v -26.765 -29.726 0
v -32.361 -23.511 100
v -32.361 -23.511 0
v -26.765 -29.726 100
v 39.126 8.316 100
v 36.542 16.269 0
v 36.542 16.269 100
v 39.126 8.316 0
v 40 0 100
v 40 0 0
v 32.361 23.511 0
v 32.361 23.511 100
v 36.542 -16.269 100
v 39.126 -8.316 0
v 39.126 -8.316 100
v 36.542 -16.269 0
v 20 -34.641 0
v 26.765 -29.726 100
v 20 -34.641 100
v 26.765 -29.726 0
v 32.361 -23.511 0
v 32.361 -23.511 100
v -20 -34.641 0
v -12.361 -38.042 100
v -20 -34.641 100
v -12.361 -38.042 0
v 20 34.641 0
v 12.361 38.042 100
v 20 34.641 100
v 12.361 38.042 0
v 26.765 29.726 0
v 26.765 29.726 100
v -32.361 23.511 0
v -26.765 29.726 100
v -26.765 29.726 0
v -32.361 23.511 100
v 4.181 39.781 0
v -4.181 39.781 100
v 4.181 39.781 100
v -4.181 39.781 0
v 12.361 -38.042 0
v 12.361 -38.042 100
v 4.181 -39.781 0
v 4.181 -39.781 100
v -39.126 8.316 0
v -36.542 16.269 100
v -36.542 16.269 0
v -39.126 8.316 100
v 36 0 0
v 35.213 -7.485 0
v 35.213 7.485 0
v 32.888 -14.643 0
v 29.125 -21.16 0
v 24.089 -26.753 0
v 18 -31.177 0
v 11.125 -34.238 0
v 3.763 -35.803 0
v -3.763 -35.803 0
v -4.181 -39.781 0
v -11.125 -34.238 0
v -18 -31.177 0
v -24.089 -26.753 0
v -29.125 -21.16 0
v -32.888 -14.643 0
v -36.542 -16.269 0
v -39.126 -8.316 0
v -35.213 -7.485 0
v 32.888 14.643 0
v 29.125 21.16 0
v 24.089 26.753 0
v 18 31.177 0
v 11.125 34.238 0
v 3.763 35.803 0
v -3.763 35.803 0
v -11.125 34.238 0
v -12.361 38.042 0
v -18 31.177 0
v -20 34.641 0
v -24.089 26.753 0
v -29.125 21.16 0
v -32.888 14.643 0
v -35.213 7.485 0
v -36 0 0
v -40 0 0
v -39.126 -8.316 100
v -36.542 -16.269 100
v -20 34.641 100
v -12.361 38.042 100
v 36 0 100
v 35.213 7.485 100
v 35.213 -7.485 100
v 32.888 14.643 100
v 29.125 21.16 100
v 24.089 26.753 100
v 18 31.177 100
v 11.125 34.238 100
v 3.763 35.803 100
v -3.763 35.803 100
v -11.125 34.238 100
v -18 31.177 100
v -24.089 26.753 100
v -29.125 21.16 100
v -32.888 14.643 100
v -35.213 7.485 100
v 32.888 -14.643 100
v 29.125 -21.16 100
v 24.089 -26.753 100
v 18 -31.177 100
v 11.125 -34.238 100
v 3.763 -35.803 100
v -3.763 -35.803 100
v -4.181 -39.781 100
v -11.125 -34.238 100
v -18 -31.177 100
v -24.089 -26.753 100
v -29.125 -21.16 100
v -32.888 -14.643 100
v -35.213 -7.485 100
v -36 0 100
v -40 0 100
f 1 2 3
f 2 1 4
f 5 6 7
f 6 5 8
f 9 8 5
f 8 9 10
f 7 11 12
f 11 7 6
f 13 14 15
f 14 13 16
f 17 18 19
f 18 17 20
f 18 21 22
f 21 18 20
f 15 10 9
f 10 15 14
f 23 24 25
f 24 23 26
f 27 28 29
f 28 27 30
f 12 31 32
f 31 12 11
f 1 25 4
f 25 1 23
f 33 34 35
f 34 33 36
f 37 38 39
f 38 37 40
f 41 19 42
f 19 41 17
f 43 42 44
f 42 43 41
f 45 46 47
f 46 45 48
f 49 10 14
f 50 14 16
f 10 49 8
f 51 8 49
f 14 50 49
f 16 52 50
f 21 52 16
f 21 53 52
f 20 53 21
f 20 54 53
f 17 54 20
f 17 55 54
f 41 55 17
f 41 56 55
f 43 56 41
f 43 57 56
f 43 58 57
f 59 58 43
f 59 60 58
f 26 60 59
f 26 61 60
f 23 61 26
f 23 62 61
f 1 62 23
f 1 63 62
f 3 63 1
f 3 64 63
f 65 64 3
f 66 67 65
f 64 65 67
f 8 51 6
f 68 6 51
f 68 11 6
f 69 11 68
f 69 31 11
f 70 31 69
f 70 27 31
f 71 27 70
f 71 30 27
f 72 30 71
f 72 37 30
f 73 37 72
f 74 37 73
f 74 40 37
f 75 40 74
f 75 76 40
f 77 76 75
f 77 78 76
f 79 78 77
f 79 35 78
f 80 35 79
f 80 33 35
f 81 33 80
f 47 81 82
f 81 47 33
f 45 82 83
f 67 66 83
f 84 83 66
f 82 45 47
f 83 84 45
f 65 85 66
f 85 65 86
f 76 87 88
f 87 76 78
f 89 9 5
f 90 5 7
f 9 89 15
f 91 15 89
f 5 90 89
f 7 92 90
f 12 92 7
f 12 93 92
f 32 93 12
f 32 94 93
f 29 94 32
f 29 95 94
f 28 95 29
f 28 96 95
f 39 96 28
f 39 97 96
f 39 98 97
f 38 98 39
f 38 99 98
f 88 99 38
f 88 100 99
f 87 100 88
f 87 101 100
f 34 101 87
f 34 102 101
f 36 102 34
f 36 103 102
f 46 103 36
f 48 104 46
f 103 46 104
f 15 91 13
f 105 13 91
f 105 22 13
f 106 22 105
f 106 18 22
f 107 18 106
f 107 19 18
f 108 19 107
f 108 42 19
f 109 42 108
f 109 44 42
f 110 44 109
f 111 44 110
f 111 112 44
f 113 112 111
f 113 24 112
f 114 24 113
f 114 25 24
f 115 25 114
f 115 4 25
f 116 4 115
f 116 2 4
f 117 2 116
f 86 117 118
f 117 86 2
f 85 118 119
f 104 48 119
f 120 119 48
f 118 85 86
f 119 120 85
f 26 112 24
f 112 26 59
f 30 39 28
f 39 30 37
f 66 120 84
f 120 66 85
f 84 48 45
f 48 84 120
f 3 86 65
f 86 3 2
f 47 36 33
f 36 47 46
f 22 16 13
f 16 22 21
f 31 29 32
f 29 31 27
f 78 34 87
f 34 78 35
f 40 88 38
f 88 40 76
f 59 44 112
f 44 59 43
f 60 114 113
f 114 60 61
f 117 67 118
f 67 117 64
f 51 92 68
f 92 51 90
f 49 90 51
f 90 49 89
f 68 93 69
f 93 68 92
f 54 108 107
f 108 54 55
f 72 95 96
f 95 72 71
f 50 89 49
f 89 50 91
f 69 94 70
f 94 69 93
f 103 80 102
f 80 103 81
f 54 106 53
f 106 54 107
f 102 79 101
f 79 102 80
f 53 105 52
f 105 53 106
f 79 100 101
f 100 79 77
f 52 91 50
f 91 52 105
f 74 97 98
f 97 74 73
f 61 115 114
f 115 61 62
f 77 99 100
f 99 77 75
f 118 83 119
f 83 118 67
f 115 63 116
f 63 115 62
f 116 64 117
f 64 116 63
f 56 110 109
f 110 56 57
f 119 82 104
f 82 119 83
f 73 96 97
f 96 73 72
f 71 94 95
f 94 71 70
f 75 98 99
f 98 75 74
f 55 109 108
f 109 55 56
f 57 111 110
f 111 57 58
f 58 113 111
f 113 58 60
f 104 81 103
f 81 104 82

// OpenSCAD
// マグカップのパラメータ
outer_diameter = 80;
height = 100;
wall_thickness = 4;
bottom_thickness = 6;
handle_radius = 12;

// 内径
inner_diameter = outer_diameter - 2 * wall_thickness;

// モジュール：マグカップ本体
module mug() {
  difference() {
    union() {
      cylinder(h = height, r = outer_diameter / 2);
      cylinder(h = bottom_thickness, r = outer_diameter / 2);
    }
    cylinder(h = height + bottom_thickness, r = inner_diameter / 2);
  }
}

// モジュール：取手
module handle() {
  translate([0, 0, height/2])
  rotate_extrude()
  circle(r=handle_radius);
}


// メイン処理
union(){
    mug();
    handle();
}
